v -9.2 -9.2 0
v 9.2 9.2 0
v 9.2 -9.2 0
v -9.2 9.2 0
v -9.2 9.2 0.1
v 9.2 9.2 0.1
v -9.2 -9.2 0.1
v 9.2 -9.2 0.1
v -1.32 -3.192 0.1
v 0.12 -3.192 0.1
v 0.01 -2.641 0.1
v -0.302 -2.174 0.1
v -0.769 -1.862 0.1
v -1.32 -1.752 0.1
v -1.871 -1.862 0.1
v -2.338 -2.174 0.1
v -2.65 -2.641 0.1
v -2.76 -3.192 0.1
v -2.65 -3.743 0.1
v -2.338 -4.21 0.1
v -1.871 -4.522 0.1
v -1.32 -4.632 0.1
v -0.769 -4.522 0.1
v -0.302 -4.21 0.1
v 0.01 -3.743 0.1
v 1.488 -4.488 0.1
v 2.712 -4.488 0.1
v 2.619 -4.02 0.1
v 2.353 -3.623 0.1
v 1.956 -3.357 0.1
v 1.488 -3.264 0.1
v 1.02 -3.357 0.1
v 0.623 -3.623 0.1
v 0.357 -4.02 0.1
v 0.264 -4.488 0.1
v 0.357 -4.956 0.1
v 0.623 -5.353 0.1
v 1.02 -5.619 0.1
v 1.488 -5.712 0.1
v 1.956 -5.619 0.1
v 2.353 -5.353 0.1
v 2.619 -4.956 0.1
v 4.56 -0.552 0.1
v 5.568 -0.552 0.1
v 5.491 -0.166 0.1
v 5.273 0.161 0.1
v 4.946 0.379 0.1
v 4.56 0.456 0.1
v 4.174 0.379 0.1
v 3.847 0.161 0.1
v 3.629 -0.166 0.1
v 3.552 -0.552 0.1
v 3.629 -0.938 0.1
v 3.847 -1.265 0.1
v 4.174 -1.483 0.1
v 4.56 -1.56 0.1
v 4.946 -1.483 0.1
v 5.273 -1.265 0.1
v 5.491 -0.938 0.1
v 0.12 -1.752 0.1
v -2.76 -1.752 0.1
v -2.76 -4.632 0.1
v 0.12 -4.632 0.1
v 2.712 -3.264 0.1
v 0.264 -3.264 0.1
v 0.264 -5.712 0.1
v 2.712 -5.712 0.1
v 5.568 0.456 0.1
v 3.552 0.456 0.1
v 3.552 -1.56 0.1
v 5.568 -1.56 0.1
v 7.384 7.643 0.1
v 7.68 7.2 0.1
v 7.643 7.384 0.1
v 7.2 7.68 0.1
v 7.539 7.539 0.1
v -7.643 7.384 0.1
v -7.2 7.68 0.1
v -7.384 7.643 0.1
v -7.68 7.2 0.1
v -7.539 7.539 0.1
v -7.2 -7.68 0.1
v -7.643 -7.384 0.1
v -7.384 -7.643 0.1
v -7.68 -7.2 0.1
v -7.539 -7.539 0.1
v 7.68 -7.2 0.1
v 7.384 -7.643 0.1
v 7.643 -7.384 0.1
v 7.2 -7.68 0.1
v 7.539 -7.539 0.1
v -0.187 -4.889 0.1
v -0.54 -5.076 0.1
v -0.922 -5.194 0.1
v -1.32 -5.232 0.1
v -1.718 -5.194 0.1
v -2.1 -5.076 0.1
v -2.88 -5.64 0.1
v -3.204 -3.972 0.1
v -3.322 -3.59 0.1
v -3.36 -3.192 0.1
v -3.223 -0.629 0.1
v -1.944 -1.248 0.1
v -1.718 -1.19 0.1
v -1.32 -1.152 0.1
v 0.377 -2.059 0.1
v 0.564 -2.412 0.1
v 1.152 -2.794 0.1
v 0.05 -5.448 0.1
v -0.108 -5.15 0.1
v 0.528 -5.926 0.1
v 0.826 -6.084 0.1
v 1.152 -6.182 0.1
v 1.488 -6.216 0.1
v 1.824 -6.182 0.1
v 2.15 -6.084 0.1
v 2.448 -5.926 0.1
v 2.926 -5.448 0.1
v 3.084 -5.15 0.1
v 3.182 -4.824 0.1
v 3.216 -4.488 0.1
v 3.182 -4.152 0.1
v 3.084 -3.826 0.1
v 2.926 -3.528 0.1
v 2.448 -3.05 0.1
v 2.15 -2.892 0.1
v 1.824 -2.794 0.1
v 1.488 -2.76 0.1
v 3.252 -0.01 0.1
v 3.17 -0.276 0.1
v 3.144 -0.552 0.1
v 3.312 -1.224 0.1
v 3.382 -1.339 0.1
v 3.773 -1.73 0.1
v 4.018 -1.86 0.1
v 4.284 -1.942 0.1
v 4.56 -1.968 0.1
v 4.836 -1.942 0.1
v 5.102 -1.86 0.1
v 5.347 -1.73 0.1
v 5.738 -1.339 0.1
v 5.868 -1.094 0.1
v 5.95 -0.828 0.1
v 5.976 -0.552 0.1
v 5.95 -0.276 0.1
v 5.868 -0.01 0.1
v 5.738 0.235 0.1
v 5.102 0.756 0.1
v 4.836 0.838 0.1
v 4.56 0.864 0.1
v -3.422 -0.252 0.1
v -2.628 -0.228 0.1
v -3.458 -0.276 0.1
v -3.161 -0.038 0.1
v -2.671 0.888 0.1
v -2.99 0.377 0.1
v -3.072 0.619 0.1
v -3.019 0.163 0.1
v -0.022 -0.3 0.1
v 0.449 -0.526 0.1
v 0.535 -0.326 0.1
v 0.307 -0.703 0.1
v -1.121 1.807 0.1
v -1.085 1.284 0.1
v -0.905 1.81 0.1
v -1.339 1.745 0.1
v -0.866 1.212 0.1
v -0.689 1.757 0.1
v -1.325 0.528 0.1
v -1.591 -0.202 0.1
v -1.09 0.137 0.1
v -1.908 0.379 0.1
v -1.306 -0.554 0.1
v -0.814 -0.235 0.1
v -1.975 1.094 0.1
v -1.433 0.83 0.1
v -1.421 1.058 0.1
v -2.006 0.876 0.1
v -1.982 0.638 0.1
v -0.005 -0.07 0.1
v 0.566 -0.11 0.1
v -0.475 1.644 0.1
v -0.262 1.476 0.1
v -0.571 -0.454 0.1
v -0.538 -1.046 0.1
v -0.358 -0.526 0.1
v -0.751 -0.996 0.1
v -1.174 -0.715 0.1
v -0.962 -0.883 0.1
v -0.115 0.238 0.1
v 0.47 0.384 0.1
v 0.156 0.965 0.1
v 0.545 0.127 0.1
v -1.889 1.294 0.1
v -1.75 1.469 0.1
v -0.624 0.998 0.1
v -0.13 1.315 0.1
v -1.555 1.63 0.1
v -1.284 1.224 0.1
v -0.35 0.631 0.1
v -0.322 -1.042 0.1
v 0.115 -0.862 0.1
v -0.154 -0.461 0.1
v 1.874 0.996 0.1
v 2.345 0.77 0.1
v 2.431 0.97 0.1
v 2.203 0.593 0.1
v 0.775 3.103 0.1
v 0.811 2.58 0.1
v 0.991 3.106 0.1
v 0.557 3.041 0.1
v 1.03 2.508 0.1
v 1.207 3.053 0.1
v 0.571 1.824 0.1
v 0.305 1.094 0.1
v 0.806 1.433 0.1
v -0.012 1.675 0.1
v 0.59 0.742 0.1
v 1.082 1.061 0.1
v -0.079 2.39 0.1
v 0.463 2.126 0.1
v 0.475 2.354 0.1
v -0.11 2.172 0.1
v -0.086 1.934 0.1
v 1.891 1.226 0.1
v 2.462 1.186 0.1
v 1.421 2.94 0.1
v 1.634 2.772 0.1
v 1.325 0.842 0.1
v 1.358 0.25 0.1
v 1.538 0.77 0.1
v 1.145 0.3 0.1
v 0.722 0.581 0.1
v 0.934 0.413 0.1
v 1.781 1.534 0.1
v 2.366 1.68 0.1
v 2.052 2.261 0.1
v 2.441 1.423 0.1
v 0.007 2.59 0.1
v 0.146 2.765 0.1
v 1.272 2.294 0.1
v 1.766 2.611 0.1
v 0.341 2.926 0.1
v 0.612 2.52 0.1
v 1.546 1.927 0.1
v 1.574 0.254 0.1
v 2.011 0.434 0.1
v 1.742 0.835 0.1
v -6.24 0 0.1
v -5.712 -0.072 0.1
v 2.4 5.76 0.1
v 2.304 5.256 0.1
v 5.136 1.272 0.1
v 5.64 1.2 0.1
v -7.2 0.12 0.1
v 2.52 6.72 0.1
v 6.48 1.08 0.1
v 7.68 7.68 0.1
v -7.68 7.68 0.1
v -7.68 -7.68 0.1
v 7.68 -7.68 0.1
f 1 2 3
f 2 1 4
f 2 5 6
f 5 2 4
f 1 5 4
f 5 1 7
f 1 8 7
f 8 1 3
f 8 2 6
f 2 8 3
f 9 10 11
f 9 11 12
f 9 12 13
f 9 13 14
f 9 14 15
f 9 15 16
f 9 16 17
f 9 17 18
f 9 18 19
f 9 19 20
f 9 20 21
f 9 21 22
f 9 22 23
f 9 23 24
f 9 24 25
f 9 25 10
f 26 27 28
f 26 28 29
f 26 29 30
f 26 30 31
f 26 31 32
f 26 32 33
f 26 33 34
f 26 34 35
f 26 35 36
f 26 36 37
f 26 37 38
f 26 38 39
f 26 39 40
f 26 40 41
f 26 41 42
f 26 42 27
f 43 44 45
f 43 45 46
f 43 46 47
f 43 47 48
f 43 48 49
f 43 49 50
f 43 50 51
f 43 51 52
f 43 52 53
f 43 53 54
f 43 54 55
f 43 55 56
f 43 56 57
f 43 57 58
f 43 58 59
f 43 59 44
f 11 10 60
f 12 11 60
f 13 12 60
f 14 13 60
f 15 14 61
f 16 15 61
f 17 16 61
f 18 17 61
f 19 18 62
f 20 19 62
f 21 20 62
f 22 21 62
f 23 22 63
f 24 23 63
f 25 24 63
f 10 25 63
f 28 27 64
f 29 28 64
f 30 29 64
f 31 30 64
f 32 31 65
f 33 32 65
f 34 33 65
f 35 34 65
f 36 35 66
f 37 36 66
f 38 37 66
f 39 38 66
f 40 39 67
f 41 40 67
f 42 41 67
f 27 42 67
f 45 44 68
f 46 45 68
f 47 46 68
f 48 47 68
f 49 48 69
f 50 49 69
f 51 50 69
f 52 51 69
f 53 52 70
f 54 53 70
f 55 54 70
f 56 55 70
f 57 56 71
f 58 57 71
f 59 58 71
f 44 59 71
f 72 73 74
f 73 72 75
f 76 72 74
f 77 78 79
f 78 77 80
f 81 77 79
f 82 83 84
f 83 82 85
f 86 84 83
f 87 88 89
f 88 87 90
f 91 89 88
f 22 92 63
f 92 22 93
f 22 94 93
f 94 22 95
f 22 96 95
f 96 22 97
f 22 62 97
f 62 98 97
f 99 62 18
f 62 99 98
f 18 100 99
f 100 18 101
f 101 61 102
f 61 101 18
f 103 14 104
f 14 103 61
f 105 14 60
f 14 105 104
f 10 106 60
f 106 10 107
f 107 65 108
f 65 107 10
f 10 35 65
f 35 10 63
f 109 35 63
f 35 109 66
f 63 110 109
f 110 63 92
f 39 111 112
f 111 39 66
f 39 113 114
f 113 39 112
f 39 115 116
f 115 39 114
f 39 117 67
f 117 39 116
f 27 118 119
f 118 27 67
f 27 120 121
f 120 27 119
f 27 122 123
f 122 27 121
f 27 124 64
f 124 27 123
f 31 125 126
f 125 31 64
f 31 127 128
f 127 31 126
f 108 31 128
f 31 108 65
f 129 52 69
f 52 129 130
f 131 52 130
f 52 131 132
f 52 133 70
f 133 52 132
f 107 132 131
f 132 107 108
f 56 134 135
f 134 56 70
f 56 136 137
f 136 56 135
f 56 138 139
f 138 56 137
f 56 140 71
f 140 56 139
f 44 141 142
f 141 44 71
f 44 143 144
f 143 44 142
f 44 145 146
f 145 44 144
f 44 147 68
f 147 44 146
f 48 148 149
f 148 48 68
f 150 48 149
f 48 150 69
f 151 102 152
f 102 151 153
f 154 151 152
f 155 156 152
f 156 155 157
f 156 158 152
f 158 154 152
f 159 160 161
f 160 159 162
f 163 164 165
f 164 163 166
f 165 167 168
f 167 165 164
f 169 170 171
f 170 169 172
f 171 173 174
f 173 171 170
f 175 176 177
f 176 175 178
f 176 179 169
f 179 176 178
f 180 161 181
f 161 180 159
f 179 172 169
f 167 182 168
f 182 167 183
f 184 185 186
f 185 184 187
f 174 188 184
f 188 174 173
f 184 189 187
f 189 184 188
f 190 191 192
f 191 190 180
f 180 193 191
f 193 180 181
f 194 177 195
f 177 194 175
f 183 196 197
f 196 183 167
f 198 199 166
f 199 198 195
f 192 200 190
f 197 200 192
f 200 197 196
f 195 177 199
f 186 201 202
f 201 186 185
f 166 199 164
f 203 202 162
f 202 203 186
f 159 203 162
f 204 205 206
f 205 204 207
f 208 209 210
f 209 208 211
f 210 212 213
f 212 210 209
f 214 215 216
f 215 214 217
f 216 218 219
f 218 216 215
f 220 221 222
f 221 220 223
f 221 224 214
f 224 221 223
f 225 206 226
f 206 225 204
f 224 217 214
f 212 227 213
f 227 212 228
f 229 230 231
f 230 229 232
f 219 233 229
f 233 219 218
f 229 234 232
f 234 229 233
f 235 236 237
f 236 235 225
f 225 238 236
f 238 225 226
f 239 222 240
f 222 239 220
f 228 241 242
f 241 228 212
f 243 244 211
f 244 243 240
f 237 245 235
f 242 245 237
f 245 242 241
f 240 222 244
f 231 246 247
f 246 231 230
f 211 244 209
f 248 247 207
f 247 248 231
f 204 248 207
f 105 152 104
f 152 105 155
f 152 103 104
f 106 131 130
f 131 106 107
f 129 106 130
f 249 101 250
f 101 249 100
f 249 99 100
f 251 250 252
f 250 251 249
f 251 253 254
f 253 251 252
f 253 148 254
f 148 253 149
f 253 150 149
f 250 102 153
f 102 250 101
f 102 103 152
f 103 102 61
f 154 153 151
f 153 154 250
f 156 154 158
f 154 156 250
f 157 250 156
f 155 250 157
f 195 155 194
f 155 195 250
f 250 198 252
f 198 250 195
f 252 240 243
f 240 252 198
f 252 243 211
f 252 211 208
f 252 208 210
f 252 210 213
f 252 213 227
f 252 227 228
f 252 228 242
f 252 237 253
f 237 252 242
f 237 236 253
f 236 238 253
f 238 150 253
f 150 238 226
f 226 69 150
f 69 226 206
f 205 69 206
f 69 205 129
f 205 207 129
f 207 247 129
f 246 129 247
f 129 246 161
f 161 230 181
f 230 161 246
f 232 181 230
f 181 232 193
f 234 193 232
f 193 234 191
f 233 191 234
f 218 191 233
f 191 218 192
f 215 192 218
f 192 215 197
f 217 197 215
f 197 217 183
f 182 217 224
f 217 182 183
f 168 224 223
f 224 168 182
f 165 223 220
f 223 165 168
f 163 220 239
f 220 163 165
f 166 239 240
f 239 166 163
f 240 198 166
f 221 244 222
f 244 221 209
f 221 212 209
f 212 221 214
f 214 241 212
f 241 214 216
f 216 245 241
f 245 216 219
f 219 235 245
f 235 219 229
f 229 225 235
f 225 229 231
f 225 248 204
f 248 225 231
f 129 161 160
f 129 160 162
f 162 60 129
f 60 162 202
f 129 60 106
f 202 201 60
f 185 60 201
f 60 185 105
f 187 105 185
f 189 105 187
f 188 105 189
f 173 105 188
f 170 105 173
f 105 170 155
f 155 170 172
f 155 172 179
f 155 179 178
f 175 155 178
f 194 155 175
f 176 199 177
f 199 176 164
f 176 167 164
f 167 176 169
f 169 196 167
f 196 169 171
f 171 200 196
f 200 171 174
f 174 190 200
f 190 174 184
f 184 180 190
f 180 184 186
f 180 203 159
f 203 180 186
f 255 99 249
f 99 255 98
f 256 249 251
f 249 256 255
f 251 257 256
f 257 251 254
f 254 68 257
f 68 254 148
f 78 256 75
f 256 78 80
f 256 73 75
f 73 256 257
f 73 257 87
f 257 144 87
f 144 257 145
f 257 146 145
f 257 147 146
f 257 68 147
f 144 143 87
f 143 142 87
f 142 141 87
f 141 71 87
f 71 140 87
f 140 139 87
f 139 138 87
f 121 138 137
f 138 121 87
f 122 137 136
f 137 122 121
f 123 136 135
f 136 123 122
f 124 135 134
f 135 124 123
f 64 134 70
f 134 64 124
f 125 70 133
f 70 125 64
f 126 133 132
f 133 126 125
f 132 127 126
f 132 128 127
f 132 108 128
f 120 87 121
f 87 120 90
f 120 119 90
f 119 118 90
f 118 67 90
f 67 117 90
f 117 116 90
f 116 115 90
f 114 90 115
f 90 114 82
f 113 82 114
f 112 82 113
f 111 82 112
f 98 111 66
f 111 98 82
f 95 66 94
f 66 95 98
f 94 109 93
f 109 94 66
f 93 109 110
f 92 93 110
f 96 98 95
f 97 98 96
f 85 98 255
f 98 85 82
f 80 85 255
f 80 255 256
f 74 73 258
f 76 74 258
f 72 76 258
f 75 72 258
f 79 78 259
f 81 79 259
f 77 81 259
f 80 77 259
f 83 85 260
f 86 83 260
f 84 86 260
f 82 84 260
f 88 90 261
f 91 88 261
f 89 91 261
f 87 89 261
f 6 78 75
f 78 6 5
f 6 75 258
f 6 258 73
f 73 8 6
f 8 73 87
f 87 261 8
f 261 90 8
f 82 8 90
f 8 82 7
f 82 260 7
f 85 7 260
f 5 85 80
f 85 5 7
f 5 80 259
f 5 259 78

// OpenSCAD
// file: ../p/4-4ndis.scad
use <../lib.scad>
function ldraw_lib__4_4ndis() = [
// 0 Disc Negative 1.0
// 0 Name: 4-4ndis.dat
// 0 Author: James Jessiman
// 0 !LDRAW_ORG Primitive UPDATE 2012-01
// 0 !LICENSE Licensed under CC BY 4.0 : see CAreadme.txt
// 
// 0 BFC CERTIFY CCW
  [0,"BFC","CERTIFY"],
  [0,"BFC","CCW"],
// 
// 0 !HISTORY 2002-03-23 [sbliss] Added BFC statement; compacted code
// 0 !HISTORY 2002-04-25 [PTadmin] Official Update 2002-02
// 0 !HISTORY 2007-06-24 [PTadmin] Header formatted for Contributor Agreement
// 0 !HISTORY 2008-07-01 [PTadmin] Official Update 2008-01
// 0 !HISTORY 2012-02-16 [Philo] Changed to CCW
// 0 !HISTORY 2012-03-30 [PTadmin] Official Update 2012-01
// 
// 
// 3 16 0.9239 0 0.3827 1 0 0 1 0 1
  [3,16,0.9239,0,0.3827,1,0,0,1,0,1],
// 3 16 0.7071 0 0.7071 0.9239 0 0.3827 1 0 1
  [3,16,0.7071,0,0.7071,0.9239,0,0.3827,1,0,1],
// 3 16 0.3827 0 0.9239 0.7071 0 0.7071 1 0 1
  [3,16,0.3827,0,0.9239,0.7071,0,0.7071,1,0,1],
// 3 16 0 0 1 0.3827 0 0.9239 1 0 1
  [3,16,0,0,1,0.3827,0,0.9239,1,0,1],
// 3 16 -0.3827 0 0.9239 0 0 1 -1 0 1
  [3,16,-0.3827,0,0.9239,0,0,1,-1,0,1],
// 3 16 -0.7071 0 0.7071 -0.3827 0 0.9239 -1 0 1
  [3,16,-0.7071,0,0.7071,-0.3827,0,0.9239,-1,0,1],
// 3 16 -0.9239 0 0.3827 -0.7071 0 0.7071 -1 0 1
  [3,16,-0.9239,0,0.3827,-0.7071,0,0.7071,-1,0,1],
// 3 16 -1 0 0 -0.9239 0 0.3827 -1 0 1
  [3,16,-1,0,0,-0.9239,0,0.3827,-1,0,1],
// 3 16 -0.9239 0 -0.3827 -1 0 0 -1 0 -1
  [3,16,-0.9239,0,-0.3827,-1,0,0,-1,0,-1],
// 3 16 -0.7071 0 -0.7071 -0.9239 0 -0.3827 -1 0 -1
  [3,16,-0.7071,0,-0.7071,-0.9239,0,-0.3827,-1,0,-1],
// 3 16 -0.3827 0 -0.9239 -0.7071 0 -0.7071 -1 0 -1
  [3,16,-0.3827,0,-0.9239,-0.7071,0,-0.7071,-1,0,-1],
// 3 16 0 0 -1 -0.3827 0 -0.9239 -1 0 -1
  [3,16,0,0,-1,-0.3827,0,-0.9239,-1,0,-1],
// 3 16 0.3827 0 -0.9239 0 0 -1 1 0 -1
  [3,16,0.3827,0,-0.9239,0,0,-1,1,0,-1],
// 3 16 0.7071 0 -0.7071 0.3827 0 -0.9239 1 0 -1
  [3,16,0.7071,0,-0.7071,0.3827,0,-0.9239,1,0,-1],
// 3 16 0.9239 0 -0.3827 0.7071 0 -0.7071 1 0 -1
  [3,16,0.9239,0,-0.3827,0.7071,0,-0.7071,1,0,-1],
// 3 16 1 0 0 0.9239 0 -0.3827 1 0 -1
  [3,16,1,0,0,0.9239,0,-0.3827,1,0,-1],
];
module ldraw_lib__4_4ndis(step=0, col=false, unit=2/5, alt=false, line=0.2, solid=!$preview)
    makepoly(ldraw_lib__4_4ndis(), step=step, col=col, unit=unit, alt=alt, line=line, solid=solid);
ldraw_lib__4_4ndis(line=0.2);
// file: ../p/4-4disc.scad
use <../lib.scad>
function ldraw_lib__4_4disc() = [
// 0 Disc 1.0
// 0 Name: 4-4disc.dat
// 0 Author: James Jessiman
// 0 !LDRAW_ORG Primitive UPDATE 2002-02
// 0 !LICENSE Licensed under CC BY 4.0 : see CAreadme.txt
// 
// 0 BFC CERTIFY CCW
  [0,"BFC","CERTIFY"],
  [0,"BFC","CCW"],
// 
// 0 !HISTORY 1998-12-15 [PTadmin] Official Update 1998-10
// 0 !HISTORY 2002-03-23 [sbliss] Added BFC statement
// 0 !HISTORY 2002-04-25 [PTadmin] Official Update 2002-02
// 0 !HISTORY 2007-06-24 [PTadmin] Header formatted for Contributor Agreement
// 0 !HISTORY 2008-07-01 [PTadmin] Official Update 2008-01
// 
// 
// 3 16 0 0 0 1 0 0 0.9239 0 0.3827
  [3,16,0,0,0,1,0,0,0.9239,0,0.3827],
// 3 16 0 0 0 0.9239 0 0.3827 0.7071 0 0.7071
  [3,16,0,0,0,0.9239,0,0.3827,0.7071,0,0.7071],
// 3 16 0 0 0 0.7071 0 0.7071 0.3827 0 0.9239
  [3,16,0,0,0,0.7071,0,0.7071,0.3827,0,0.9239],
// 3 16 0 0 0 0.3827 0 0.9239 0 0 1
  [3,16,0,0,0,0.3827,0,0.9239,0,0,1],
// 3 16 0 0 0 0 0 1 -0.3827 0 0.9239
  [3,16,0,0,0,0,0,1,-0.3827,0,0.9239],
// 3 16 0 0 0 -0.3827 0 0.9239 -0.7071 0 0.7071
  [3,16,0,0,0,-0.3827,0,0.9239,-0.7071,0,0.7071],
// 3 16 0 0 0 -0.7071 0 0.7071 -0.9239 0 0.3827
  [3,16,0,0,0,-0.7071,0,0.7071,-0.9239,0,0.3827],
// 3 16 0 0 0 -0.9239 0 0.3827 -1 0 -0
  [3,16,0,0,0,-0.9239,0,0.3827,-1,0,-0],
// 3 16 0 0 0 -1 0 -0 -0.9239 0 -0.3827
  [3,16,0,0,0,-1,0,-0,-0.9239,0,-0.3827],
// 3 16 0 0 0 -0.9239 0 -0.3827 -0.7071 0 -0.7071
  [3,16,0,0,0,-0.9239,0,-0.3827,-0.7071,0,-0.7071],
// 3 16 0 0 0 -0.7071 0 -0.7071 -0.3827 0 -0.9239
  [3,16,0,0,0,-0.7071,0,-0.7071,-0.3827,0,-0.9239],
// 3 16 0 0 0 -0.3827 0 -0.9239 0 0 -1
  [3,16,0,0,0,-0.3827,0,-0.9239,0,0,-1],
// 3 16 0 0 0 0 0 -1 0.3827 0 -0.9239
  [3,16,0,0,0,0,0,-1,0.3827,0,-0.9239],
// 3 16 0 0 0 0.3827 0 -0.9239 0.7071 0 -0.7071
  [3,16,0,0,0,0.3827,0,-0.9239,0.7071,0,-0.7071],
// 3 16 0 0 0 0.7071 0 -0.7071 0.9239 0 -0.3827
  [3,16,0,0,0,0.7071,0,-0.7071,0.9239,0,-0.3827],
// 3 16 0 0 0 0.9239 0 -0.3827 1 0 0
  [3,16,0,0,0,0.9239,0,-0.3827,1,0,0],
// 0
];
module ldraw_lib__4_4disc(step=0, col=false, unit=2/5, alt=false, line=0.2, solid=!$preview)
    makepoly(ldraw_lib__4_4disc(), step=step, col=col, unit=unit, alt=alt, line=line, solid=solid);
ldraw_lib__4_4disc(line=0.2);
// file: ../p/1-4chrd.scad
use <../lib.scad>
function ldraw_lib__1_4chrd() = [
// 0 Chord 0.25
// 0 Name: 1-4chrd.dat
// 0 Author: Max Martin Richter [MMR1988]
// 0 !LDRAW_ORG Primitive UPDATE 2023-05
// 0 !LICENSE Licensed under CC BY 4.0 : see CAreadme.txt
// 
// 0 BFC CERTIFY CCW
  [0,"BFC","CERTIFY"],
  [0,"BFC","CCW"],
// 
// 0 !HISTORY 2004-04-22 [PTadmin] Official Update 2004-02
// 0 !HISTORY 2007-10-09 [PTadmin] Header formatted for Contributor Agreement
// 0 !HISTORY 2008-07-01 [PTadmin] Official Update 2008-01
// 0 !HISTORY 2012-08-02 [MMR1988] Re-creation with PrimGen2 and Rectifier
// 0 !HISTORY 2012-08-09 [PTadmin] Official Update 2012-02
// 0 !HISTORY 2023-10-27 [OrionP] Change author to MMR1988 from hafhead
// 0 !HISTORY 2023-10-31 [OrionP] Official Update 2023-05
// 
// 4 16 0.9239 0 0.3827 0.3827 0 0.9239 0 0 1 1 0 0
  [4,16,0.9239,0,0.3827,0.3827,0,0.9239,0,0,1,1,0,0],
// 3 16 0.7071 0 0.7071 0.3827 0 0.9239 0.9239 0 0.3827
  [3,16,0.7071,0,0.7071,0.3827,0,0.9239,0.9239,0,0.3827],
];
module ldraw_lib__1_4chrd(step=0, col=false, unit=2/5, alt=false, line=0.2, solid=!$preview)
    makepoly(ldraw_lib__1_4chrd(), step=step, col=col, unit=unit, alt=alt, line=line, solid=solid);
ldraw_lib__1_4chrd(line=0.2);
// file: ../p/box5-12.scad
use <../lib.scad>
function ldraw_lib__box5_12() = [
// 0 Box with 5 Faces without Any Edges
// 0 Name: box5-12.dat
// 0 Author: Chris Dee [cwdee]
// 0 !LDRAW_ORG Primitive UPDATE 2009-02
// 0 !LICENSE Licensed under CC BY 4.0 : see CAreadme.txt
// 
// 0 BFC CERTIFY CCW
  [0,"BFC","CERTIFY"],
  [0,"BFC","CCW"],
// 
// 0 !HISTORY 2009-09-03 [PTadmin] Official Update 2009-02
// 
// 
// 4 16 1 1 1 1 1 -1 -1 1 -1 -1 1 1
  [4,16,1,1,1,1,1,-1,-1,1,-1,-1,1,1],
// 4 16 -1 0 1 1 0 1 1 1 1 -1 1 1
  [4,16,-1,0,1,1,0,1,1,1,1,-1,1,1],
// 4 16 -1 0 -1 -1 0 1 -1 1 1 -1 1 -1
  [4,16,-1,0,-1,-1,0,1,-1,1,1,-1,1,-1],
// 4 16 1 0 -1 -1 0 -1 -1 1 -1 1 1 -1
  [4,16,1,0,-1,-1,0,-1,-1,1,-1,1,1,-1],
// 4 16 1 0 1 1 0 -1 1 1 -1 1 1 1
  [4,16,1,0,1,1,0,-1,1,1,-1,1,1,1],
// 0
];
module ldraw_lib__box5_12(step=0, col=false, unit=2/5, alt=false, line=0.2, solid=!$preview)
    makepoly(ldraw_lib__box5_12(), step=step, col=col, unit=unit, alt=alt, line=line, solid=solid);
ldraw_lib__box5_12(line=0.2);
// file: ../p/1-4ndis.scad
use <../lib.scad>
function ldraw_lib__1_4ndis() = [
// 0 Disc Negative 0.25
// 0 Name: 1-4ndis.dat
// 0 Author: James Jessiman
// 0 !LDRAW_ORG Primitive UPDATE 2012-01
// 0 !LICENSE Licensed under CC BY 4.0 : see CAreadme.txt
// 
// 0 BFC CERTIFY CCW
  [0,"BFC","CERTIFY"],
  [0,"BFC","CCW"],
// 
// 0 !HISTORY 2002-03-23 [sbliss] Added BFC Statement
// 0 !HISTORY 2002-04-25 [PTadmin] Official Update 2002-02
// 0 !HISTORY 2007-06-22 [PTadmin] Header formatted for Contributor Agreement
// 0 !HISTORY 2008-07-01 [PTadmin] Official Update 2008-01
// 0 !HISTORY 2012-02-16 [Philo] Changed to CCW
// 0 !HISTORY 2012-03-30 [PTadmin] Official Update 2012-01
// 
// 
// 3 16 0.9239 0 0.3827 1 0 0 1 0 1
  [3,16,0.9239,0,0.3827,1,0,0,1,0,1],
// 3 16 0.7071 0 0.7071 0.9239 0 0.3827 1 0 1
  [3,16,0.7071,0,0.7071,0.9239,0,0.3827,1,0,1],
// 3 16 0.3827 0 0.9239 0.7071 0 0.7071 1 0 1
  [3,16,0.3827,0,0.9239,0.7071,0,0.7071,1,0,1],
// 3 16 0 0 1 0.3827 0 0.9239 1 0 1
  [3,16,0,0,1,0.3827,0,0.9239,1,0,1],
];
module ldraw_lib__1_4ndis(step=0, col=false, unit=2/5, alt=false, line=0.2, solid=!$preview)
    makepoly(ldraw_lib__1_4ndis(), step=step, col=col, unit=unit, alt=alt, line=line, solid=solid);
ldraw_lib__1_4ndis(line=0.2);
// main file
use <../lib.scad>
use <../p/1-4ndis.scad>
use <../p/box5-12.scad>
use <s/160205ds01.scad>
function ldraw_lib__160205a() = [
// 0 Sticker  2.3 x  2.3 with Bank Note and Coins
// 0 Name: 160205a.dat
// 0 Author: Takeshi Takahashi [RainbowDolphin]
// 0 !LDRAW_ORG Part UPDATE 2023-02
// 0 !LICENSE Licensed under CC BY 4.0 : see CAreadme.txt
// 
// 0 BFC CERTIFY CCW
  [0,"BFC","CERTIFY"],
  [0,"BFC","CCW"],
// 
// 0 !KEYWORDS Bricklink 1490stk01, Brickowl 763104, Rebrickable 160205
// 0 !KEYWORDS Security van, Set 1490, Town bank
// 
// 0 !HISTORY 2023-04-17 [OrionP] Official Update 2023-02
// 
// 
// 1 16 0 -0.25 0 23 0 0 0 0.25 0 0 0 23 box5-12.dat
  [1,16,0,-0.25,0,23,0,0,0,0.25,0,0,0,23, ldraw_lib__box5_12()],
// 1 16 0 -.25 0 .6 0 0 0 1 0 0 0 .6 s\160205ds01.dat
  [1,16,0,-.25,0,.6,0,0,0,1,0,0,0,.6, ldraw_lib__s__160205ds01()],
// 1 0 18 -0.25 18 1.2 0 0 0 1 0 0 0 1.2 1-4ndis.dat
  [1,0,18,-0.25,18,1.2,0,0,0,1,0,0,0,1.2, ldraw_lib__1_4ndis()],
// 1 0 -18 -0.25 18 0 0 -1.2 0 1 0 1.2 0 0 1-4ndis.dat
  [1,0,-18,-0.25,18,0,0,-1.2,0,1,0,1.2,0,0, ldraw_lib__1_4ndis()],
// 1 0 -18 -0.25 -18 -1.2 0 0 0 1 0 0 0 -1.2 1-4ndis.dat
  [1,0,-18,-0.25,-18,-1.2,0,0,0,1,0,0,0,-1.2, ldraw_lib__1_4ndis()],
// 1 0 18 -0.25 -18 0 0 1.2 0 1 0 -1.2 0 0 1-4ndis.dat
  [1,0,18,-0.25,-18,0,0,1.2,0,1,0,-1.2,0,0, ldraw_lib__1_4ndis()],
// 4 0 23 -0.25 23 -23 -0.25 23 -18 -0.25 19.2 18 -0.25 19.2
  [4,0,23,-0.25,23,-23,-0.25,23,-18,-0.25,19.2,18,-0.25,19.2],
// 3 0 23 -0.25 23 18 -0.25 19.2 19.2 -0.25 19.2
  [3,0,23,-0.25,23,18,-0.25,19.2,19.2,-0.25,19.2],
// 3 0 23 -0.25 23 19.2 -0.25 19.2 19.2 -0.25 18
  [3,0,23,-0.25,23,19.2,-0.25,19.2,19.2,-0.25,18],
// 4 0 23 -0.25 23 19.2 -0.25 18 19.2 -0.25 -18 23 -0.25 -23
  [4,0,23,-0.25,23,19.2,-0.25,18,19.2,-0.25,-18,23,-0.25,-23],
// 3 0 19.2 -0.25 -18 19.2 -0.25 -19.2 23 -0.25 -23
  [3,0,19.2,-0.25,-18,19.2,-0.25,-19.2,23,-0.25,-23],
// 3 0 19.2 -0.25 -19.2 18 -0.25 -19.2 23 -0.25 -23
  [3,0,19.2,-0.25,-19.2,18,-0.25,-19.2,23,-0.25,-23],
// 4 0 23 -0.25 -23 18 -0.25 -19.2 -18 -0.25 -19.2 -23 -0.25 -23
  [4,0,23,-0.25,-23,18,-0.25,-19.2,-18,-0.25,-19.2,-23,-0.25,-23],
// 3 0 -18 -0.25 -19.2 -19.2 -0.25 -19.2 -23 -0.25 -23
  [3,0,-18,-0.25,-19.2,-19.2,-0.25,-19.2,-23,-0.25,-23],
// 3 0 -19.2 -0.25 -18 -23 -0.25 -23 -19.2 -0.25 -19.2
  [3,0,-19.2,-0.25,-18,-23,-0.25,-23,-19.2,-0.25,-19.2],
// 4 0 -23 -0.25 -23 -19.2 -0.25 -18 -19.2 -0.25 18 -23 -0.25 23
  [4,0,-23,-0.25,-23,-19.2,-0.25,-18,-19.2,-0.25,18,-23,-0.25,23],
// 3 0 -23 -0.25 23 -19.2 -0.25 18 -19.2 -0.25 19.2
  [3,0,-23,-0.25,23,-19.2,-0.25,18,-19.2,-0.25,19.2],
// 3 0 -23 -0.25 23 -19.2 -0.25 19.2 -18 -0.25 19.2
  [3,0,-23,-0.25,23,-19.2,-0.25,19.2,-18,-0.25,19.2],
];
module ldraw_lib__160205a(step=0, col=false, unit=2/5, alt=false, line=0.2, solid=!$preview)
    makepoly(ldraw_lib__160205a(), step=step, col=col, unit=unit, alt=alt, line=line, solid=solid);
ldraw_lib__160205a(line=0.2);
